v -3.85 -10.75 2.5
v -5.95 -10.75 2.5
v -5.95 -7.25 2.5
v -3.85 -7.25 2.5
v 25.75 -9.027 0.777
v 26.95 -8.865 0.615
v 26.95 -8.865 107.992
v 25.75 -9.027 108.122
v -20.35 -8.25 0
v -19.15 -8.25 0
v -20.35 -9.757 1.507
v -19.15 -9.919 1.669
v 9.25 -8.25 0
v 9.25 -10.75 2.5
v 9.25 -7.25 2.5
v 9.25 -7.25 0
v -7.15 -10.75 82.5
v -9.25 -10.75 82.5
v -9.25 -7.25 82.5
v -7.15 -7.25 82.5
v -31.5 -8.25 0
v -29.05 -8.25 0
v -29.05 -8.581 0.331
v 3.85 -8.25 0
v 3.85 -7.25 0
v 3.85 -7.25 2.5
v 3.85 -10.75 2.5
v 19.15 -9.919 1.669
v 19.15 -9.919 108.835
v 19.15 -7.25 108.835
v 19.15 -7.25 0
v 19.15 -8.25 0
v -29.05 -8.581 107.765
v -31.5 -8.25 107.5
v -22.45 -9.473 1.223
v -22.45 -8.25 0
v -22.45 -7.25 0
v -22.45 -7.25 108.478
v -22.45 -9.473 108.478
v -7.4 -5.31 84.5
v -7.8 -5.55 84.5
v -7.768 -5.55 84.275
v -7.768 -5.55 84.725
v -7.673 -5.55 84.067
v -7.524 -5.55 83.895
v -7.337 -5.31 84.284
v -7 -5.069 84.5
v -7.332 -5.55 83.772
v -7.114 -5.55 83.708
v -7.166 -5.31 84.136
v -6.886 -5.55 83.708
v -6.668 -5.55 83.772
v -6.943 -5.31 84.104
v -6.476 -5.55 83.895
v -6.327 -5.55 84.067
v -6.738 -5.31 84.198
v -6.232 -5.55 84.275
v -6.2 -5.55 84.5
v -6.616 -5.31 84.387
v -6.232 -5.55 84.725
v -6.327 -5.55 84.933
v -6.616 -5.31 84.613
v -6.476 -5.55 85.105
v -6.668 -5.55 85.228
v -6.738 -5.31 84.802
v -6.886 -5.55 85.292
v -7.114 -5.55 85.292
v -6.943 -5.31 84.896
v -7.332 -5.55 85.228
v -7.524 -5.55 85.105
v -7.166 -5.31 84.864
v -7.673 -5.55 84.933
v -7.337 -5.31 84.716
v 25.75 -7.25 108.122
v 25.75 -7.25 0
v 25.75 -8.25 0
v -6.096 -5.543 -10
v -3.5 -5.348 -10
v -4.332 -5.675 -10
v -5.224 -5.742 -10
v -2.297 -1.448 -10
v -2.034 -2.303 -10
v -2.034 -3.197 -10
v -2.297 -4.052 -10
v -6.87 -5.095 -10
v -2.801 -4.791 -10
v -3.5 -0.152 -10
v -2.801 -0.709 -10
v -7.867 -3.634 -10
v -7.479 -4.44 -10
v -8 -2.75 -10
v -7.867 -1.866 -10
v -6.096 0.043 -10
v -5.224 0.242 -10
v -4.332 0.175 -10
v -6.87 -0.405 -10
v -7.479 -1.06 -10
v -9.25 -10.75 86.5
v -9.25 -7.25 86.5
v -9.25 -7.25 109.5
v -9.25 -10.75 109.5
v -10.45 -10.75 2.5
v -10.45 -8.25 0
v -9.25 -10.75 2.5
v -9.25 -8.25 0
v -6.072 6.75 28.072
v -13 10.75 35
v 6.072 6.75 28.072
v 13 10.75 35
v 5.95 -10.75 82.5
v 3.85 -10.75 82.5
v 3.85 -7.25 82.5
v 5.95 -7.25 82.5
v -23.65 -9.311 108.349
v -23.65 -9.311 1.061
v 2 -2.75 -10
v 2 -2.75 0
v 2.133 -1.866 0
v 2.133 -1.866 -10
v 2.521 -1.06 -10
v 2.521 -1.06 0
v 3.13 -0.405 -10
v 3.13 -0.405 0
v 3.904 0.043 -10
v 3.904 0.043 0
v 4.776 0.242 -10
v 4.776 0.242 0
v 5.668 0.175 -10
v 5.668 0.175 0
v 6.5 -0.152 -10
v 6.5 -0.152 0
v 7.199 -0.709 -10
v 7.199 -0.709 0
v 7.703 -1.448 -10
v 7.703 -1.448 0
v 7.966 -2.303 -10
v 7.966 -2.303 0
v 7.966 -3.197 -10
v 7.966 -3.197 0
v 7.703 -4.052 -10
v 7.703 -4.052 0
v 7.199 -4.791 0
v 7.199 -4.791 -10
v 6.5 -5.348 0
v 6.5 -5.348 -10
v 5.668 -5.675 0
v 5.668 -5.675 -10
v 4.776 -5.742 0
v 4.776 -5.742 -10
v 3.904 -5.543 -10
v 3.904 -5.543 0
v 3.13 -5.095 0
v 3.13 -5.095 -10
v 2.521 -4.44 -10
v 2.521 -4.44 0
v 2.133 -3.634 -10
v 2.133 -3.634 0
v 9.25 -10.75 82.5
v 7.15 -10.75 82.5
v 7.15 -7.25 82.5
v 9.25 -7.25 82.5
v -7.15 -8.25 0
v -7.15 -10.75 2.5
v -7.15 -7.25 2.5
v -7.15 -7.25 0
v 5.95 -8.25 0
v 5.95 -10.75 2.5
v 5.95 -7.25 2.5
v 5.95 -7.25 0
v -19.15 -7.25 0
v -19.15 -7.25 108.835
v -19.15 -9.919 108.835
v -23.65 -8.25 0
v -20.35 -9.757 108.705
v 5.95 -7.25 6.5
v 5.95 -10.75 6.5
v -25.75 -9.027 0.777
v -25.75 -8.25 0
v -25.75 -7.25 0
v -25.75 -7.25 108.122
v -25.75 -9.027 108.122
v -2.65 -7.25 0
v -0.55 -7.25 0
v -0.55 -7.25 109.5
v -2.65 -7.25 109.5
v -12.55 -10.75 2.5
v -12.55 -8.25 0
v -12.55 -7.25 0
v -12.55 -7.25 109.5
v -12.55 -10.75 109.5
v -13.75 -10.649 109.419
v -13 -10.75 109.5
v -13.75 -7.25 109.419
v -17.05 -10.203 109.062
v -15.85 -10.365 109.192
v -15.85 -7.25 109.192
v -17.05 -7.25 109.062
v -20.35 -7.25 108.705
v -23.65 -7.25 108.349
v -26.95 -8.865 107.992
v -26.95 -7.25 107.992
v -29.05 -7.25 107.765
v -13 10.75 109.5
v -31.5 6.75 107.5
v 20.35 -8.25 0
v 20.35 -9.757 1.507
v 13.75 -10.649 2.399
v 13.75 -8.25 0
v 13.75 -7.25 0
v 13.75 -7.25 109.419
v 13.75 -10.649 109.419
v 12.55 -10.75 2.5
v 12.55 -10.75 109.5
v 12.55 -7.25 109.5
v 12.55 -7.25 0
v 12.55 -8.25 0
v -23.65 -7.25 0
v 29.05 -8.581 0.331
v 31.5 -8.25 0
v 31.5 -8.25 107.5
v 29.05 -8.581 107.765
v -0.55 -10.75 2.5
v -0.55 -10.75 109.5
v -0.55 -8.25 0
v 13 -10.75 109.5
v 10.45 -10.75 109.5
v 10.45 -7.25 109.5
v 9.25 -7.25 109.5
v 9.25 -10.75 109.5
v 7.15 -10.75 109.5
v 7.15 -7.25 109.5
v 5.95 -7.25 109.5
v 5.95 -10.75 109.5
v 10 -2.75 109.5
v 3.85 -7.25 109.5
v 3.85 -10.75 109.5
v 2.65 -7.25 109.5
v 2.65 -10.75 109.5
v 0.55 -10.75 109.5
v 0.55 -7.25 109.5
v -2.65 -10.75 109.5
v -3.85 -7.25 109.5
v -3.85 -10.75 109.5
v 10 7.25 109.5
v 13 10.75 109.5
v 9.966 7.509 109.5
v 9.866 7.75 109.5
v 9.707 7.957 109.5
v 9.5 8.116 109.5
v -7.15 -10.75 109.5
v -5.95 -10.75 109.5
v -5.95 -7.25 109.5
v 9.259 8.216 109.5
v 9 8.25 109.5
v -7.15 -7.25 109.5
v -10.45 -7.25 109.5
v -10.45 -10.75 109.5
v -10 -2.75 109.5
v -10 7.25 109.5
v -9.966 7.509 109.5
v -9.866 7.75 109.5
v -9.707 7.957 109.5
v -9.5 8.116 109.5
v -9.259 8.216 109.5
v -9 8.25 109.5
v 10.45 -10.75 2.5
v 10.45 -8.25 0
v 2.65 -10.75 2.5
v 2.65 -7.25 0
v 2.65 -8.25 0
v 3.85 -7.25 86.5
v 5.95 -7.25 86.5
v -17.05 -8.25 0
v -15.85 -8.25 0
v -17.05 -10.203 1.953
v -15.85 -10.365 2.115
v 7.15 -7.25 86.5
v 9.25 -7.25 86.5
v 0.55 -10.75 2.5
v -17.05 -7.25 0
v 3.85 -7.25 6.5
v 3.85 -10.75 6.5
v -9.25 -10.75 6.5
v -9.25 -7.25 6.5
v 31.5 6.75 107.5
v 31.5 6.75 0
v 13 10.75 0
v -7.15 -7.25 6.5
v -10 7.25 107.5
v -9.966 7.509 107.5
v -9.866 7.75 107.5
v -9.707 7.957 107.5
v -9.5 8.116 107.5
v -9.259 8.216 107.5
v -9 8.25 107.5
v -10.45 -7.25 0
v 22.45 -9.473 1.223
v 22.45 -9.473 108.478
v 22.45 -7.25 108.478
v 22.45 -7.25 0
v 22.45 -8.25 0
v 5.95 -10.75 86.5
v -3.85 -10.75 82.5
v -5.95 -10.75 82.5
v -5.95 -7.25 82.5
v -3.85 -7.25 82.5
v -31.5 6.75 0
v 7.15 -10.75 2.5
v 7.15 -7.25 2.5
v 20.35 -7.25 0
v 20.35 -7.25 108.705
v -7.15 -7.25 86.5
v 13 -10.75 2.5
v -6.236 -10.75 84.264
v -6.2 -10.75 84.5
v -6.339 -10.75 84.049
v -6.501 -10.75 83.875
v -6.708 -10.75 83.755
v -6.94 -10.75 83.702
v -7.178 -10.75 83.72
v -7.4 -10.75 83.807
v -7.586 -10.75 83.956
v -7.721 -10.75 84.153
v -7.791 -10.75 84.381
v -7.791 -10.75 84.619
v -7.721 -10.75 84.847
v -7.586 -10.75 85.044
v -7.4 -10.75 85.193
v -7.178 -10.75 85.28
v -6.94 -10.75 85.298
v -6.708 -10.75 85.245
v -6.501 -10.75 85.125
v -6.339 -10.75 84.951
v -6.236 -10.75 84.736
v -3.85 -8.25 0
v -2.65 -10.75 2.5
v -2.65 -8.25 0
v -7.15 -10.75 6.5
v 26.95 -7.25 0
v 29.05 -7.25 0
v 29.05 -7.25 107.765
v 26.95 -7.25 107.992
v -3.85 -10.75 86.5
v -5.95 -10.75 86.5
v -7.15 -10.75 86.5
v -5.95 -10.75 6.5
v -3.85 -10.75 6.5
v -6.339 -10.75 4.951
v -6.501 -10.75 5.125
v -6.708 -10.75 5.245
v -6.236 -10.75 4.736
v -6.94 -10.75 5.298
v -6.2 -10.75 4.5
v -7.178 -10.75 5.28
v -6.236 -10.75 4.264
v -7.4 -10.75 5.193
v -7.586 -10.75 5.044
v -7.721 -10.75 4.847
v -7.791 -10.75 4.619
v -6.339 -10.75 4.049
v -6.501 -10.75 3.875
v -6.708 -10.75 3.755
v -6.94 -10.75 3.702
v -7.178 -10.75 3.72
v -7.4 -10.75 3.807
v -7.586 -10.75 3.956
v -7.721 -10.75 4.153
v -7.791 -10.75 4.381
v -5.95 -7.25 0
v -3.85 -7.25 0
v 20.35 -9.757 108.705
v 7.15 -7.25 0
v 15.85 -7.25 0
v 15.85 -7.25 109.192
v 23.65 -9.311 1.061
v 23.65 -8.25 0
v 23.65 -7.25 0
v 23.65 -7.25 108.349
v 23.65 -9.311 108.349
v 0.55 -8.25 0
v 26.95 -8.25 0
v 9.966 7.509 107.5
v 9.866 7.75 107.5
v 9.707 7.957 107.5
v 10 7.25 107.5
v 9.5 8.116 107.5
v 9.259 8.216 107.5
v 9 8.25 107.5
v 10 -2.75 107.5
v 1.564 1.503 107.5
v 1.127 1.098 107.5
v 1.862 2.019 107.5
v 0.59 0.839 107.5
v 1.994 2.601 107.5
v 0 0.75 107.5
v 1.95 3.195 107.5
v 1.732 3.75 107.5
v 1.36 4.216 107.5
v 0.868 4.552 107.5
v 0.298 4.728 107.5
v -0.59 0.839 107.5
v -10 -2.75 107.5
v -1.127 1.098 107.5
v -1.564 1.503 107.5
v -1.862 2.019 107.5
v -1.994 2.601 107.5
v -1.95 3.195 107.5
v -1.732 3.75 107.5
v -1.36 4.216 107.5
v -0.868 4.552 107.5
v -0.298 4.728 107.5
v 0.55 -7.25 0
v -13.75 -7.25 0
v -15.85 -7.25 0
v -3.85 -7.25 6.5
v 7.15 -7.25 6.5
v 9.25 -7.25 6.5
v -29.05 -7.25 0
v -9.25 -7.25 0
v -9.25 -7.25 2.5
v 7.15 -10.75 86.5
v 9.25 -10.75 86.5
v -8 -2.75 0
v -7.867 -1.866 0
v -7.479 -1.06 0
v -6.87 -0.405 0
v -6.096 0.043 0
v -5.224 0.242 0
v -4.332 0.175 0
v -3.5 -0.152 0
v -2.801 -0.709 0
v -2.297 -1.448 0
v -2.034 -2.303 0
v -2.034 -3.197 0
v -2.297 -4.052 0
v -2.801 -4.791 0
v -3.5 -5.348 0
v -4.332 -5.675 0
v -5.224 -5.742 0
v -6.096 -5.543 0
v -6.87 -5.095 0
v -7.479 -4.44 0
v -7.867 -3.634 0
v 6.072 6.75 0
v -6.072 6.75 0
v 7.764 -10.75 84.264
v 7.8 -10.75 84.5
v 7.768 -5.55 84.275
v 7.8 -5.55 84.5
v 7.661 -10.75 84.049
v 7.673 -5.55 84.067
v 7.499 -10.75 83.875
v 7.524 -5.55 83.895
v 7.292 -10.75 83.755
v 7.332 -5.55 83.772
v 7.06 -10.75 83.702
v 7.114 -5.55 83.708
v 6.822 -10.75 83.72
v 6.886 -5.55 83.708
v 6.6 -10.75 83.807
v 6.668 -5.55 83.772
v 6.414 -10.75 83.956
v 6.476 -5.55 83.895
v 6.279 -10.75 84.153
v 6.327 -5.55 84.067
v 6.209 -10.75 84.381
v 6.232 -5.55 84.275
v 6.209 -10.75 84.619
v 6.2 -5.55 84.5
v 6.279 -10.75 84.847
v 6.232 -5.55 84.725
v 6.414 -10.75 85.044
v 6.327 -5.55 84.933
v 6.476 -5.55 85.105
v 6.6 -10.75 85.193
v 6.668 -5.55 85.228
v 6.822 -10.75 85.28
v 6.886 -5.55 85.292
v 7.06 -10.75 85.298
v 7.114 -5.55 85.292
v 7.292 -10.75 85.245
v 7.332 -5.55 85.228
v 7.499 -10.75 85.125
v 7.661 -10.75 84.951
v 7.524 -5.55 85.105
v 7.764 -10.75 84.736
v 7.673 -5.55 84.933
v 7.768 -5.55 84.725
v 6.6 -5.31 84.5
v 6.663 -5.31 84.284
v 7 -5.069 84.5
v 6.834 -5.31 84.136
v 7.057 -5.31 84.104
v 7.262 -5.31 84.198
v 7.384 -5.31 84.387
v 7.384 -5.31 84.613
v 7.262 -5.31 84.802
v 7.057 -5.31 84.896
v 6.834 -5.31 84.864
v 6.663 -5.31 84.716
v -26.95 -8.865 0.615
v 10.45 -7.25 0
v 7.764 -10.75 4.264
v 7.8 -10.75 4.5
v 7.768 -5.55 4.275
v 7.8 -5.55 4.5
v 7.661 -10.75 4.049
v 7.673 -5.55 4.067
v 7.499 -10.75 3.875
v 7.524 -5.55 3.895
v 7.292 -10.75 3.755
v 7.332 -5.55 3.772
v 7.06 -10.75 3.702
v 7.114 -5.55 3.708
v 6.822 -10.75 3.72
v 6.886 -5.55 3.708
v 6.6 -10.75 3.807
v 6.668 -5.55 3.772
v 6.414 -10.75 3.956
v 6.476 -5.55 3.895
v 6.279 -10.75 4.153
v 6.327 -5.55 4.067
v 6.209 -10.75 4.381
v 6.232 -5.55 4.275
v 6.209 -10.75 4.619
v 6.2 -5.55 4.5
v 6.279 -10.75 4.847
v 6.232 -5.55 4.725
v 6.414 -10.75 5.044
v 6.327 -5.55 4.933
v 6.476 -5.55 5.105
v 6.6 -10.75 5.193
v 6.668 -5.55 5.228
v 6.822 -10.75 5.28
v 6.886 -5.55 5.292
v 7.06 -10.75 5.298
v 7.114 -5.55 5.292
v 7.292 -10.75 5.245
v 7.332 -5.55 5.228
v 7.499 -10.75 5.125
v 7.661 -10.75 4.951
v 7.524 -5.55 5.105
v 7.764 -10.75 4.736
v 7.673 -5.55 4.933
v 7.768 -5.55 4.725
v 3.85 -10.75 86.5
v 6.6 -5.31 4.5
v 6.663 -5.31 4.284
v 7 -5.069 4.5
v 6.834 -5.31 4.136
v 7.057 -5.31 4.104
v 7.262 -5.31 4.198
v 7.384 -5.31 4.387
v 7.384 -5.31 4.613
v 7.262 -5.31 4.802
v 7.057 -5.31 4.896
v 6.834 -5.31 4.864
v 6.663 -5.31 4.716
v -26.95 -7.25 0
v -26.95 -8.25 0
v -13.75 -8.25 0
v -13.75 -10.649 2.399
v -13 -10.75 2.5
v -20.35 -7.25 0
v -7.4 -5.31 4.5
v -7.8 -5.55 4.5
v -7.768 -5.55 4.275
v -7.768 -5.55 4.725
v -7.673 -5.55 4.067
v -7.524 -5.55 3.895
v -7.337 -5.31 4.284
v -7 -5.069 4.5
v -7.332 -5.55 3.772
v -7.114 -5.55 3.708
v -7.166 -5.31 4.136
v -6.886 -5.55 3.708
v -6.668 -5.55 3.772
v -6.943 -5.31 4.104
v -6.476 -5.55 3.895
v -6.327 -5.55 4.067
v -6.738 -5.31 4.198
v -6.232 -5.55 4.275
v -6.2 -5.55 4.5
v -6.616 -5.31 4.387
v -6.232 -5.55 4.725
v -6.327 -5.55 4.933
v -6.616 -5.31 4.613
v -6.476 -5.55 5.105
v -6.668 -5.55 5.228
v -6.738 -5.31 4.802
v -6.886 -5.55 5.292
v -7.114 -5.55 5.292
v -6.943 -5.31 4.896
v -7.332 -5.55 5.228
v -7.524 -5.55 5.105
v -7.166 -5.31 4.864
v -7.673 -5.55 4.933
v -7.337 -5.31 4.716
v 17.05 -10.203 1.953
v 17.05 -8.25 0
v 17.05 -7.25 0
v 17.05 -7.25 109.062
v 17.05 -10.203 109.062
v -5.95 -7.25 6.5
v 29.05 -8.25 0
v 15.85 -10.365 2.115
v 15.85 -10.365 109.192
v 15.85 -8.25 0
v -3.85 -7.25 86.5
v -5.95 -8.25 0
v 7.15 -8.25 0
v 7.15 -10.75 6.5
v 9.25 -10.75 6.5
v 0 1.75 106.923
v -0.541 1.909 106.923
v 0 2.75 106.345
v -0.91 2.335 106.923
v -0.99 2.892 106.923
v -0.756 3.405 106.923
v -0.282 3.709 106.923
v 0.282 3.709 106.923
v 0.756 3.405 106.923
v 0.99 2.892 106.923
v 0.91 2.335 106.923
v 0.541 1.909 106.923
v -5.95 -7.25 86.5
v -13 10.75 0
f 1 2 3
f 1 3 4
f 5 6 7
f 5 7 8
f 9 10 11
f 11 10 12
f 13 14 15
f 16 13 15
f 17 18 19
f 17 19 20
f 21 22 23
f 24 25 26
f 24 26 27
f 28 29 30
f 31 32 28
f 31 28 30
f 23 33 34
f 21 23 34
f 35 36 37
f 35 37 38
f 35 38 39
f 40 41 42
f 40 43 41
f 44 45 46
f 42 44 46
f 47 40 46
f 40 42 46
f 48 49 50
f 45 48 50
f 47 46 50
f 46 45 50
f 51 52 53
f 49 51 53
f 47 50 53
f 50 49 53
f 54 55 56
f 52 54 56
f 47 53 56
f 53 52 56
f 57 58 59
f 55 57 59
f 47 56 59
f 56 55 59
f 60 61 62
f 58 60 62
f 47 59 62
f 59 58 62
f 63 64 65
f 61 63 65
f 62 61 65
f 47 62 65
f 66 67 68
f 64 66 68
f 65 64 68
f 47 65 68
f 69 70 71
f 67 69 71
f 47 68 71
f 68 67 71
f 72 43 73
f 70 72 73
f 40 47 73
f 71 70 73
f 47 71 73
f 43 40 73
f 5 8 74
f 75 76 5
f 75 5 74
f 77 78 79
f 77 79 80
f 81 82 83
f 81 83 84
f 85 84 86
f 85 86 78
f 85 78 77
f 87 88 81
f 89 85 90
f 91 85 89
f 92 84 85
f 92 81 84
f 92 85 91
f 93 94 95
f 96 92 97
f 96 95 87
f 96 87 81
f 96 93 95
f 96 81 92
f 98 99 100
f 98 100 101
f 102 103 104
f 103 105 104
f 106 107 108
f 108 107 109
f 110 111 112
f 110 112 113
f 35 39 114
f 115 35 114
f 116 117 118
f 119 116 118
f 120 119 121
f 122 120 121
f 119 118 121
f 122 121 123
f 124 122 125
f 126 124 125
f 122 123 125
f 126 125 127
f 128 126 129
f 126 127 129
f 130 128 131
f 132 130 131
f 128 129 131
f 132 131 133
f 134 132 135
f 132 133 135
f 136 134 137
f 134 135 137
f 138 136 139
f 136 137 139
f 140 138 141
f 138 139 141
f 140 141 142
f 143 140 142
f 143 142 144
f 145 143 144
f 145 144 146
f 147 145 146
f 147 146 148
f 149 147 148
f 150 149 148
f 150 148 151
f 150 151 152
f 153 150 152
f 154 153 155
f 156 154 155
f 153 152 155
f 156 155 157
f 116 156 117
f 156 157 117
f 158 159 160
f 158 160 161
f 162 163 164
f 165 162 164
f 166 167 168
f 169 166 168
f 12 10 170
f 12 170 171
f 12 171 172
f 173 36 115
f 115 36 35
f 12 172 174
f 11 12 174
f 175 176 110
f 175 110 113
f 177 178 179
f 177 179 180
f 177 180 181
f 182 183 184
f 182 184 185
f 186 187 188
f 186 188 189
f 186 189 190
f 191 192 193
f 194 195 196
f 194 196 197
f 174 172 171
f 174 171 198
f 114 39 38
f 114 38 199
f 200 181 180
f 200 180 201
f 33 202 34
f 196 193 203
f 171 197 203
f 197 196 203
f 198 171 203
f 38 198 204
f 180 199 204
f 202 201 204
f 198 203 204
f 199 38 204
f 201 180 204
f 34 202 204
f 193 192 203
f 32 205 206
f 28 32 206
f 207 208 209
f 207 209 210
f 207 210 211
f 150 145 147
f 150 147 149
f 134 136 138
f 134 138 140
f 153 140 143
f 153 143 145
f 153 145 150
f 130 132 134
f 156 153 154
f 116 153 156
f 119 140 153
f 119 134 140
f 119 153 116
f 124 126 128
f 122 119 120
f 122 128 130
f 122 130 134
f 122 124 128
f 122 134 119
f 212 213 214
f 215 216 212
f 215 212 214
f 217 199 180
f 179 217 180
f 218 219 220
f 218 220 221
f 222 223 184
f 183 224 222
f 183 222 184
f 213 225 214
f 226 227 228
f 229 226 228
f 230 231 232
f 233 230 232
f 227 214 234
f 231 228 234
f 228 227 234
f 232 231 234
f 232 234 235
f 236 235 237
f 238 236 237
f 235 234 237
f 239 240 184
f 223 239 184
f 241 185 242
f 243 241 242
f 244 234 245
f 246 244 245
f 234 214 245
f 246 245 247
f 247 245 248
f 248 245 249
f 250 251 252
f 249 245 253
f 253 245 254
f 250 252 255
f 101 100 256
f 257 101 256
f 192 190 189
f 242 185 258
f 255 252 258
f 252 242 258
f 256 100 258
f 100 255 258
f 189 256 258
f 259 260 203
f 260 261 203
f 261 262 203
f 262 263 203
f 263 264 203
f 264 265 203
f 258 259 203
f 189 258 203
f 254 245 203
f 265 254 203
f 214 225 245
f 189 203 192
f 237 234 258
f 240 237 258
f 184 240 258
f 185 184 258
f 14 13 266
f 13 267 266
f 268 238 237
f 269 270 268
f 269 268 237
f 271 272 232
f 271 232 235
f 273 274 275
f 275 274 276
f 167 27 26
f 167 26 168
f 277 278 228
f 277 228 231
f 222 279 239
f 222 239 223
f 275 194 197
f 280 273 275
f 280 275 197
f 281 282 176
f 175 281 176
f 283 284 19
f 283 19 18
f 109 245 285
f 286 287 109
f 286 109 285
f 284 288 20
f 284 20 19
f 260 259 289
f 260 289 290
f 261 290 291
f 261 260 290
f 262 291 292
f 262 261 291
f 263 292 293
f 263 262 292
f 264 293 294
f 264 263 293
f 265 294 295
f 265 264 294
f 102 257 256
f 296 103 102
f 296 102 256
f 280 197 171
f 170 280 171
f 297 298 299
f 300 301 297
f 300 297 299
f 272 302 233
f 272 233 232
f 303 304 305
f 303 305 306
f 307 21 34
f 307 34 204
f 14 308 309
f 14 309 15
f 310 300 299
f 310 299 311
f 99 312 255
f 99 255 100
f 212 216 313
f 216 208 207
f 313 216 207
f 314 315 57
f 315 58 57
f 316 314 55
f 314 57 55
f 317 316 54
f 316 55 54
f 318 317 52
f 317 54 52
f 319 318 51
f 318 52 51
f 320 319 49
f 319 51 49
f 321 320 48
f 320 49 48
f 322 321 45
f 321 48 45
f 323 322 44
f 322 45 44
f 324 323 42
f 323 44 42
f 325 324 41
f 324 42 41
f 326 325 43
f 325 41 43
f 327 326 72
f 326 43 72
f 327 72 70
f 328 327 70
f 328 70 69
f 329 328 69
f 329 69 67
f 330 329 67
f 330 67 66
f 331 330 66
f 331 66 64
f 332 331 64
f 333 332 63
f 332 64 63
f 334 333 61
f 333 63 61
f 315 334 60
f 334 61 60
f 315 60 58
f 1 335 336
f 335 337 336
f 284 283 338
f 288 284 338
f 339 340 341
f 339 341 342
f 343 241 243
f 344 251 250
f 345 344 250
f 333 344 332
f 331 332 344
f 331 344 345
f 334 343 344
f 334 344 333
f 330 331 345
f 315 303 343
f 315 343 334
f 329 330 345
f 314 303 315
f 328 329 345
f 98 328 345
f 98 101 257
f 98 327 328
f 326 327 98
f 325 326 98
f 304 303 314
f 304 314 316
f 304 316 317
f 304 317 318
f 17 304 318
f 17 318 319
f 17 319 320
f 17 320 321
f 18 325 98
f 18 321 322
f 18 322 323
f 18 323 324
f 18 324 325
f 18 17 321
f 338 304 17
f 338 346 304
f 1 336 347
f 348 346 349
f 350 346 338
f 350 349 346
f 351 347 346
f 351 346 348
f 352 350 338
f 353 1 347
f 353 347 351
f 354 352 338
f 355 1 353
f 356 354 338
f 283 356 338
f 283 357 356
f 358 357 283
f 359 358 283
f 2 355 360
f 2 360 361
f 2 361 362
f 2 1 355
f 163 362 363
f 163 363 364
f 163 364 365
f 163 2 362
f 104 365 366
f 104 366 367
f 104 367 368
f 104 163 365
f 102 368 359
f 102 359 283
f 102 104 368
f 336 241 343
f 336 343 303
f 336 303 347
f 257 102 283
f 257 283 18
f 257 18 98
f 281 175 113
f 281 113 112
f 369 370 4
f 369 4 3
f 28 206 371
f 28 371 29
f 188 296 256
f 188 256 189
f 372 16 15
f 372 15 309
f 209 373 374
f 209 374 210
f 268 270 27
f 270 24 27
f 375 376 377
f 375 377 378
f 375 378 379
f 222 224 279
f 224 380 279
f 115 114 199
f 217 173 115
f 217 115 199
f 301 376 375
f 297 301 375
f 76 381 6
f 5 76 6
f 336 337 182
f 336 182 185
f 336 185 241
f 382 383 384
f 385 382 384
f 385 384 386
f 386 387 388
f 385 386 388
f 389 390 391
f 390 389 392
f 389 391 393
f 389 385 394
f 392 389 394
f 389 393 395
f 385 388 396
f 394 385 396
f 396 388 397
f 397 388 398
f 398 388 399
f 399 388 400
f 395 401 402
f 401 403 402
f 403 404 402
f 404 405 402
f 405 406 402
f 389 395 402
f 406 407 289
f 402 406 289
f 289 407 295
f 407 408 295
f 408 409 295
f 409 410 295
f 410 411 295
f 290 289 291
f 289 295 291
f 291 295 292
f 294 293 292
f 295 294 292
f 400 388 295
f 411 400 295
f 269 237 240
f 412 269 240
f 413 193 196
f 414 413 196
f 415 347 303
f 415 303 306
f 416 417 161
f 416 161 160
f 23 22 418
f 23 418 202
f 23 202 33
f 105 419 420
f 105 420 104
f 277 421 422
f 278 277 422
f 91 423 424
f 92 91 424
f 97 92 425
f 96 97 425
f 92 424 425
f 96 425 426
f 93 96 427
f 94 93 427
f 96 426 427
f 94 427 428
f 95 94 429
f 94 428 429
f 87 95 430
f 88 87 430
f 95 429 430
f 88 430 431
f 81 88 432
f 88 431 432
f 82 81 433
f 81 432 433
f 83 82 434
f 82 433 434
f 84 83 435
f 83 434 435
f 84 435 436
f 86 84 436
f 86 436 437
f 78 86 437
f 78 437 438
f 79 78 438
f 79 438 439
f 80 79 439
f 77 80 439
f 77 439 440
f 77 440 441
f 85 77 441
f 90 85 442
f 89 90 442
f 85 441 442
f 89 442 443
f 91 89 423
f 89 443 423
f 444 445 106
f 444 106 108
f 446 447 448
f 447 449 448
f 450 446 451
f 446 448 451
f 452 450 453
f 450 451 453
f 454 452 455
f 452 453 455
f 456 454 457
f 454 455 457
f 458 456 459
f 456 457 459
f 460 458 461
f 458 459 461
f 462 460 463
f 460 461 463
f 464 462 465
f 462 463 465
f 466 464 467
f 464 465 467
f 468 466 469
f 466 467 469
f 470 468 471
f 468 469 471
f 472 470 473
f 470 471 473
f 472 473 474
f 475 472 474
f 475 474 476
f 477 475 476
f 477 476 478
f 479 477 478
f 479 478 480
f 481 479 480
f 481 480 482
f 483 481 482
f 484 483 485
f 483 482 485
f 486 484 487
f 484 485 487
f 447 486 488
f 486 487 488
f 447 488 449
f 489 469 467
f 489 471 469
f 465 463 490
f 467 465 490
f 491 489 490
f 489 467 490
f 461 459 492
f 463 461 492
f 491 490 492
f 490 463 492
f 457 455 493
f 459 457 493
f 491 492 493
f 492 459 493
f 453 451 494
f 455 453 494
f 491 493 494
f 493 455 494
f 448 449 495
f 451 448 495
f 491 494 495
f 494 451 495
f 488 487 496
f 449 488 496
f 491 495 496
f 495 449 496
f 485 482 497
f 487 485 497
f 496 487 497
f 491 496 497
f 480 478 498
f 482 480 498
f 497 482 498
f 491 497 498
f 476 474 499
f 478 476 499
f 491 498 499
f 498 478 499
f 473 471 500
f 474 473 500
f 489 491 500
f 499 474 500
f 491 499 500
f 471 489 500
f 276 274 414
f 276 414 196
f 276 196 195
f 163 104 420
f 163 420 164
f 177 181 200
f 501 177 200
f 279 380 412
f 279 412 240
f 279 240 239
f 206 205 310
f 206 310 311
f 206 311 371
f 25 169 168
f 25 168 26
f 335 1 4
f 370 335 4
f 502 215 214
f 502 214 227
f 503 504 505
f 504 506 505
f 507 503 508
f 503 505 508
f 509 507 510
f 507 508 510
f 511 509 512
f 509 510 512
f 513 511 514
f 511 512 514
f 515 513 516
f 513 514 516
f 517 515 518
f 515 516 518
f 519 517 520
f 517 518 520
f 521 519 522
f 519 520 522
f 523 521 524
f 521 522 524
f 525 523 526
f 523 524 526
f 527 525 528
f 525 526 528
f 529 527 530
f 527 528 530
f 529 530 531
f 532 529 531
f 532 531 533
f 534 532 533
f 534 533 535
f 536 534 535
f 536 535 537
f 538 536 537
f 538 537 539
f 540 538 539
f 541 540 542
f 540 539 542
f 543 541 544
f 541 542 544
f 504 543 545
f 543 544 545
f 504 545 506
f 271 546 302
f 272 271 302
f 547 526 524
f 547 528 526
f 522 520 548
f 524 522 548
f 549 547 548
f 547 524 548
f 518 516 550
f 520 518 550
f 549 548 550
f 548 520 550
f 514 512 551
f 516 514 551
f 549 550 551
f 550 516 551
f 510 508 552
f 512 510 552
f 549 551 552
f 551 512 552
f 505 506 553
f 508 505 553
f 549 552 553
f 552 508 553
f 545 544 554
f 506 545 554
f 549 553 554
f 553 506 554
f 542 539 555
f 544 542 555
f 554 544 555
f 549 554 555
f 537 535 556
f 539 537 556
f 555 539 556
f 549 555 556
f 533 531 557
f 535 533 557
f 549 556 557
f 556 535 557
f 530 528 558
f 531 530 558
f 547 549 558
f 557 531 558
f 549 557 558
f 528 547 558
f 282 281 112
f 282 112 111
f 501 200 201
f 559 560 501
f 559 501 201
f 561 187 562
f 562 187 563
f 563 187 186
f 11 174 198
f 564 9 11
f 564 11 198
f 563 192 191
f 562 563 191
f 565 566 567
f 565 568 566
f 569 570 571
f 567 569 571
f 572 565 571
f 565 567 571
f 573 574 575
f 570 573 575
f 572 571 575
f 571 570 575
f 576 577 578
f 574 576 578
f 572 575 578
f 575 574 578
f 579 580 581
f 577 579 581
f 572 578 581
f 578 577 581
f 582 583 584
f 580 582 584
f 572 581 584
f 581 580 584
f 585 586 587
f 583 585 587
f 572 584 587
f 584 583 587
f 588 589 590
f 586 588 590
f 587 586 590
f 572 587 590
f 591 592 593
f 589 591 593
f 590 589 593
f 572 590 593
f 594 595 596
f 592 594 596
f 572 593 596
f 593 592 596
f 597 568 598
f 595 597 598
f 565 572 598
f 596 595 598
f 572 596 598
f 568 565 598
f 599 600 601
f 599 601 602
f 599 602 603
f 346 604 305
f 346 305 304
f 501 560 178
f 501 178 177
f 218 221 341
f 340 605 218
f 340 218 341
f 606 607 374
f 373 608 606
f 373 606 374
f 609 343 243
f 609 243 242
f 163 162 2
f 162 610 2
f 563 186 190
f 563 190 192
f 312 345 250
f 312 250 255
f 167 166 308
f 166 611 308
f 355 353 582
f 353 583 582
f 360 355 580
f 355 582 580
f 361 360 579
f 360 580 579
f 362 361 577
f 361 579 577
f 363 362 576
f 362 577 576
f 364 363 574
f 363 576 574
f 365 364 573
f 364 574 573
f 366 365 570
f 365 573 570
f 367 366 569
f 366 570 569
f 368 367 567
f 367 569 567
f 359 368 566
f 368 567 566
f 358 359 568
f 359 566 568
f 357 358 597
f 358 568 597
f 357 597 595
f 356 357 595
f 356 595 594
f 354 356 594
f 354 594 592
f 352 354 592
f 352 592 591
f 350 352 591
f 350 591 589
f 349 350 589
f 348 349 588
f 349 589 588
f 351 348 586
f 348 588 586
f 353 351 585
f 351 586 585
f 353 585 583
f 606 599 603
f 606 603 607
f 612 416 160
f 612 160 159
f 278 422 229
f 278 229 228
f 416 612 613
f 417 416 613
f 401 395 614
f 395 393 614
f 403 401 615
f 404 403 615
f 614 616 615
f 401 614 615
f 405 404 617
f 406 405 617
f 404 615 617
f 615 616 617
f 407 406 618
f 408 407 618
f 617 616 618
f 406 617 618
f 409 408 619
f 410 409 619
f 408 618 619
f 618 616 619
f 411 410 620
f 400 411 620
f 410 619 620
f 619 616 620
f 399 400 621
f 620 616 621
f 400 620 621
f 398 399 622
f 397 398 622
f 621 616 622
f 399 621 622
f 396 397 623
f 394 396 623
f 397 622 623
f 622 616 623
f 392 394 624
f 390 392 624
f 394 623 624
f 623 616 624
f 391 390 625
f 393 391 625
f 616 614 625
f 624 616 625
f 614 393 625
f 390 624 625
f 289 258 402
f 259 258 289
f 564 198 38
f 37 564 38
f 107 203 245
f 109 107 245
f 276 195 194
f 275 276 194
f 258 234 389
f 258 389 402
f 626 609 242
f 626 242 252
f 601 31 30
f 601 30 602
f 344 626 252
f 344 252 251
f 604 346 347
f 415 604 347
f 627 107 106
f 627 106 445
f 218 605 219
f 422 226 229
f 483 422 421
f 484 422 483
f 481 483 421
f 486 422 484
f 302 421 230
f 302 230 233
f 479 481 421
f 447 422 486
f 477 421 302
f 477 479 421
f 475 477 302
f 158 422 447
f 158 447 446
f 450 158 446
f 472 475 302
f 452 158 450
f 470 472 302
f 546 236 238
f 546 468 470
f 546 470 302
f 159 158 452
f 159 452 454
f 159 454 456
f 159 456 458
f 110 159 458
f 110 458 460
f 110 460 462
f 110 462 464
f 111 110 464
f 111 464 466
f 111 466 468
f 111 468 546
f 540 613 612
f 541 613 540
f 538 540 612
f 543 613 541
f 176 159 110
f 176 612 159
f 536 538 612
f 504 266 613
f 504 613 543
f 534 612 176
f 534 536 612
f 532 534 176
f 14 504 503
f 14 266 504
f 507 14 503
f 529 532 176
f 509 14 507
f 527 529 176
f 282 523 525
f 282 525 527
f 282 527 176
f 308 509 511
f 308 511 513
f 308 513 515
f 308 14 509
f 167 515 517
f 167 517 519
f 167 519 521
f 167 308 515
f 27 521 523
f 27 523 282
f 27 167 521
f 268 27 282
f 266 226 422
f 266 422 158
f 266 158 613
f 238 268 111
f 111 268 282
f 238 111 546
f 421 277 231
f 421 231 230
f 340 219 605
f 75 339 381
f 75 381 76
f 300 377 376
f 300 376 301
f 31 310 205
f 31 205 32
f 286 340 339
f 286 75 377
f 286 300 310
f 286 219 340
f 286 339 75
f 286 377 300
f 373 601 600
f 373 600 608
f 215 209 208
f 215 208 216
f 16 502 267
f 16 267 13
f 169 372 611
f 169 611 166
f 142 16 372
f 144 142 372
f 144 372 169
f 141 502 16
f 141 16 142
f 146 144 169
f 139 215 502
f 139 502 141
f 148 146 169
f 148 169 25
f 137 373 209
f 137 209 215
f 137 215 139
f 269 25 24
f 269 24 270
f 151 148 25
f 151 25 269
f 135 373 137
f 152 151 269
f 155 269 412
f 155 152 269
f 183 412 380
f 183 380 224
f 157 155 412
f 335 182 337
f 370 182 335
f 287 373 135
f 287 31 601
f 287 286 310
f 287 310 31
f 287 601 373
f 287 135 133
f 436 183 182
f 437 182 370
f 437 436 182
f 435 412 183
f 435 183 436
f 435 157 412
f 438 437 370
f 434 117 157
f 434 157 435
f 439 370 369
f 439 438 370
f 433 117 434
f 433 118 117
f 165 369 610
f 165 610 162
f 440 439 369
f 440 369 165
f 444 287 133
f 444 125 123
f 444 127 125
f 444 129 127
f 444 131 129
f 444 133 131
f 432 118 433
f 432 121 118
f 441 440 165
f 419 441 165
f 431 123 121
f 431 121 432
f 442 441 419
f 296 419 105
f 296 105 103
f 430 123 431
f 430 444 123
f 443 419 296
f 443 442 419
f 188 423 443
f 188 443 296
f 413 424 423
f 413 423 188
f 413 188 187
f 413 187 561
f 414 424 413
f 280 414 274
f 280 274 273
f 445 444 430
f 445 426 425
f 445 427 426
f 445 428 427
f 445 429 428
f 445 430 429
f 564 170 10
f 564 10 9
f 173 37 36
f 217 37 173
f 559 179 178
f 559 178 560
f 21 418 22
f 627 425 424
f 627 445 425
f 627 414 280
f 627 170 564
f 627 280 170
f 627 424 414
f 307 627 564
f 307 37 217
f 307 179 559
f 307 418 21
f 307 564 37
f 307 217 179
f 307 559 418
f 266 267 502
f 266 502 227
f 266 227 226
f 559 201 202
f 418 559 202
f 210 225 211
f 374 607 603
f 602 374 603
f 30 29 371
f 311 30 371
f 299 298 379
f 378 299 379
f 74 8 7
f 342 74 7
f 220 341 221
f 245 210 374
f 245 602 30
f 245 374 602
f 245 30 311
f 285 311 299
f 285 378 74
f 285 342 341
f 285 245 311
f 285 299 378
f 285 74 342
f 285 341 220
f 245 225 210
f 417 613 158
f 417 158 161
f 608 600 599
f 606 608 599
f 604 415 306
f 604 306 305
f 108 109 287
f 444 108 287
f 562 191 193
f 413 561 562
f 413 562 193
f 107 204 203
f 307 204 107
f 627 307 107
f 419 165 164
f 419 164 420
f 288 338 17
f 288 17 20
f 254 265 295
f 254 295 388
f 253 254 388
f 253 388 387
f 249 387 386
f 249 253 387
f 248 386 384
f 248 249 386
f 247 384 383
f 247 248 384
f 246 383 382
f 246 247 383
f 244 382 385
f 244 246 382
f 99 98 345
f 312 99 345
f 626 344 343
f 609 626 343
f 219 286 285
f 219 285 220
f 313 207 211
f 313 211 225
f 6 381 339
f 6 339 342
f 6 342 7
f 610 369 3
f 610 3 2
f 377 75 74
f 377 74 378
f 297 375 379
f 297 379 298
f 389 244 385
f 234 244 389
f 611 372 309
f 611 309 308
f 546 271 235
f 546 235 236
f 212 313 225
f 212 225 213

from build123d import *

# Parameters (mm, degrees)
EXTRUDE_1_DEPTH        = 109.5
SKETCH_2_W             = 26
SKETCH_2_H             = 50
CUT_EXTRUDE_1_DEPTH    = 4
CUT_EXTRUDE_1_DRAFT    = -60
CUT_EXTRUDE_2_DEPTH    = 127.786483901
CUT_EXTRUDE_3_DEPTH    = 116.951498481
CUT_EXTRUDE_4_DEPTH    = 2
SKETCH_7_W             = 6.8
SKETCH_7_H             = 4
EXTRUDE_2_DEPTH        = 3.5
HOLE_WIZARD_M2_1_D     = 1.6
HOLE_WIZARD_M2_1_DEPTH = 5.2
HOLE_WIZARD_M2_1_TIP   = 0.480688495
SKETCH_11_R            = 3
EXTRUDE_3_DEPTH        = 10


with BuildPart() as part:
    # 草图1 → 凸台-拉伸1 (new body)
    with BuildSketch(Plane.XY):
        Polygon((31.5, 6.75), (31.5, -8.25), (29.05, -8.581081081), (29.05, -7.25), (26.95, -7.25), (26.95, -8.864864865), (25.75, -9.027027027), (25.75, -7.25), (23.65, -7.25), (23.65, -9.310810811), (22.45, -9.472972973), (22.45, -7.25), (20.35, -7.25), (20.35, -9.756756757), (19.15, -9.918918919), (19.15, -7.25), (17.05, -7.25), (17.05, -10.202702703), (15.85, -10.364864865), (15.85, -7.25), (13.75, -7.25), (13.75, -10.648648649), (13, -10.75), (12.55, -10.75), (12.55, -7.25), (10.45, -7.25), (10.45, -10.75), (9.25, -10.75), (9.25, -7.25), (7.15, -7.25), (7.15, -10.75), (5.95, -10.75), (5.95, -7.25), (3.85, -7.25), (3.85, -10.75), (2.65, -10.75), (2.65, -7.25), (0.55, -7.25), (0.55, -10.75), (-0.55, -10.75), (-0.55, -7.25), (-2.65, -7.25), (-2.65, -10.75), (-3.85, -10.75), (-3.85, -7.25), (-5.95, -7.25), (-5.95, -10.75), (-7.15, -10.75), (-7.15, -7.25), (-9.25, -7.25), (-9.25, -10.75), (-10.45, -10.75), (-10.45, -7.25), (-12.55, -7.25), (-12.55, -10.75), (-13, -10.75), (-13.75, -10.648648649), (-13.75, -7.25), (-15.85, -7.25), (-15.85, -10.364864865), (-17.05, -10.202702703), (-17.05, -7.25), (-19.15, -7.25), (-19.15, -9.918918919), (-20.35, -9.756756757), (-20.35, -7.25), (-22.45, -7.25), (-22.45, -9.472972973), (-23.65, -9.310810811), (-23.65, -7.25), (-25.75, -7.25), (-25.75, -9.027027027), (-26.95, -8.864864865), (-26.95, -7.25), (-29.05, -7.25), (-29.05, -8.581081081), (-31.5, -8.25), (-31.5, 6.75), (-13, 10.75), (13, 10.75), align=None)
    extrude(amount=EXTRUDE_1_DEPTH)


with BuildPart() as cut_extrude_1_tool:
    # 草图2 → 切除-拉伸1 (with draft: the straight prism first)
    with BuildSketch(Plane(origin=(0, 10.75, 0), x_dir=(1, 0, 0), z_dir=(0, 1, 0))):
        with Locations((0, -10)):
            Rectangle(SKETCH_2_W, SKETCH_2_H)
    extrude(amount=-CUT_EXTRUDE_1_DEPTH)
    # 切除-拉伸1: the draft: its side faces are tilted about the plane it starts from
    cut_extrude_1_sides = [cut_extrude_1_tool.faces().sort_by_distance(p)[0] for p in [
        (-13, 8.75, 10),
        (0, 8.75, 35),
        (13, 8.75, 10),
        (0, 8.75, -15),
    ]]
    draft(cut_extrude_1_sides, Plane(origin=(0, 10.75, 0), x_dir=(1, 0, 0), z_dir=(0, 1, 0)), CUT_EXTRUDE_1_DRAFT)


with BuildPart() as part_1:
    add(part.part)

    # 切除-拉伸1: cut by cut_extrude_1_tool
    add(cut_extrude_1_tool.part, mode=Mode.SUBTRACT)

    # 草图3 → 切除-拉伸2 (cut, through all)
    with BuildSketch(Plane(origin=(31.5, 0, 0), x_dir=(0, 0, -1), z_dir=(1, 0, 0))):
        Polygon((0, -8.25), (-2.5, -10.75), (0, -10.75), align=None)
    extrude(amount=-CUT_EXTRUDE_2_DEPTH, mode=Mode.SUBTRACT)

    # 草图4 → 切除-拉伸3 (cut, through all)
    with BuildSketch(Plane(origin=(0, 10.75, 0), x_dir=(1, 0, 0), z_dir=(0, 1, 0))):
        Polygon((13, -109.5), (31.5, -107.5), (31.5, -109.5), align=None)
        Polygon((-31.5, -107.5), (-31.5, -109.5), (-13, -109.5), align=None)
    extrude(amount=-CUT_EXTRUDE_3_DEPTH, mode=Mode.SUBTRACT)

    # 草图5 → 切除-拉伸4 (cut)
    with BuildSketch(Plane.XY.offset(109.5)):
        with BuildLine():
            Line((-9, 8.25), (9, 8.25))
            ThreePointArc((9, 8.25), (9.707106781, 7.957106781), (10, 7.25))
            Line((10, 7.25), (10, -2.75))
            Line((10, -2.75), (-10, -2.75))
            Line((-10, -2.75), (-10, 7.25))
            ThreePointArc((-10, 7.25), (-9.707106781, 7.957106781), (-9, 8.25))
        make_face()
    extrude(amount=-CUT_EXTRUDE_4_DEPTH, mode=Mode.SUBTRACT)

    # 切除-拉伸5 cone 1 section (through the dimple's axis) → 切除-拉伸5 (revolve, cut)
    with BuildSketch(Plane(origin=(0, 2.75, 107.5), x_dir=(0, -1, 0), z_dir=(1, 0, 0))):
        Polygon((0, 0), (2, 0), (0, 1.154700538), align=None)
    revolve(axis=Axis((0, 2.75, 107.5), (0, 0, -1)), mode=Mode.SUBTRACT)

    # 草图7 → 凸台-拉伸2 (add)
    with BuildSketch(Plane.XZ.offset(10.75)):
        with Locations((-7, 84.5)):
            Rectangle(SKETCH_7_W, SKETCH_7_H)
        with Locations((7, 84.5)):
            Rectangle(SKETCH_7_W, SKETCH_7_H)
        with Locations((7, 4.5)):
            Rectangle(SKETCH_7_W, SKETCH_7_H)
        with Locations((-7, 4.5)):
            Rectangle(SKETCH_7_W, SKETCH_7_H)
    extrude(amount=-EXTRUDE_2_DEPTH)

    # M2 螺纹孔1
    with Locations(Plane(origin=(0, -10.75, 0), x_dir=(-1, 0, 0), z_dir=(0, -1, 0))):
        with Locations((7, -4.5), (-7, -4.5), (7, -84.5), (-7, -84.5)):
            Hole(HOLE_WIZARD_M2_1_D / 2, depth=HOLE_WIZARD_M2_1_DEPTH)
            with Locations((0, 0, -(HOLE_WIZARD_M2_1_DEPTH + HOLE_WIZARD_M2_1_TIP / 2))):  # 118° drill point
                Cone(0, HOLE_WIZARD_M2_1_D / 2, HOLE_WIZARD_M2_1_TIP, mode=Mode.SUBTRACT)

    # 草图11 → 凸台-拉伸3 (add)
    with BuildSketch(Plane(origin=(0, 0, 0), x_dir=(-1, 0, 0), z_dir=(0, 0, -1))):
        with Locations((5, -2.75)):
            Circle(SKETCH_11_R)
        with Locations((-5, -2.75)):
            Circle(SKETCH_11_R)
    extrude(amount=EXTRUDE_3_DEPTH)


solid = part_1.part
